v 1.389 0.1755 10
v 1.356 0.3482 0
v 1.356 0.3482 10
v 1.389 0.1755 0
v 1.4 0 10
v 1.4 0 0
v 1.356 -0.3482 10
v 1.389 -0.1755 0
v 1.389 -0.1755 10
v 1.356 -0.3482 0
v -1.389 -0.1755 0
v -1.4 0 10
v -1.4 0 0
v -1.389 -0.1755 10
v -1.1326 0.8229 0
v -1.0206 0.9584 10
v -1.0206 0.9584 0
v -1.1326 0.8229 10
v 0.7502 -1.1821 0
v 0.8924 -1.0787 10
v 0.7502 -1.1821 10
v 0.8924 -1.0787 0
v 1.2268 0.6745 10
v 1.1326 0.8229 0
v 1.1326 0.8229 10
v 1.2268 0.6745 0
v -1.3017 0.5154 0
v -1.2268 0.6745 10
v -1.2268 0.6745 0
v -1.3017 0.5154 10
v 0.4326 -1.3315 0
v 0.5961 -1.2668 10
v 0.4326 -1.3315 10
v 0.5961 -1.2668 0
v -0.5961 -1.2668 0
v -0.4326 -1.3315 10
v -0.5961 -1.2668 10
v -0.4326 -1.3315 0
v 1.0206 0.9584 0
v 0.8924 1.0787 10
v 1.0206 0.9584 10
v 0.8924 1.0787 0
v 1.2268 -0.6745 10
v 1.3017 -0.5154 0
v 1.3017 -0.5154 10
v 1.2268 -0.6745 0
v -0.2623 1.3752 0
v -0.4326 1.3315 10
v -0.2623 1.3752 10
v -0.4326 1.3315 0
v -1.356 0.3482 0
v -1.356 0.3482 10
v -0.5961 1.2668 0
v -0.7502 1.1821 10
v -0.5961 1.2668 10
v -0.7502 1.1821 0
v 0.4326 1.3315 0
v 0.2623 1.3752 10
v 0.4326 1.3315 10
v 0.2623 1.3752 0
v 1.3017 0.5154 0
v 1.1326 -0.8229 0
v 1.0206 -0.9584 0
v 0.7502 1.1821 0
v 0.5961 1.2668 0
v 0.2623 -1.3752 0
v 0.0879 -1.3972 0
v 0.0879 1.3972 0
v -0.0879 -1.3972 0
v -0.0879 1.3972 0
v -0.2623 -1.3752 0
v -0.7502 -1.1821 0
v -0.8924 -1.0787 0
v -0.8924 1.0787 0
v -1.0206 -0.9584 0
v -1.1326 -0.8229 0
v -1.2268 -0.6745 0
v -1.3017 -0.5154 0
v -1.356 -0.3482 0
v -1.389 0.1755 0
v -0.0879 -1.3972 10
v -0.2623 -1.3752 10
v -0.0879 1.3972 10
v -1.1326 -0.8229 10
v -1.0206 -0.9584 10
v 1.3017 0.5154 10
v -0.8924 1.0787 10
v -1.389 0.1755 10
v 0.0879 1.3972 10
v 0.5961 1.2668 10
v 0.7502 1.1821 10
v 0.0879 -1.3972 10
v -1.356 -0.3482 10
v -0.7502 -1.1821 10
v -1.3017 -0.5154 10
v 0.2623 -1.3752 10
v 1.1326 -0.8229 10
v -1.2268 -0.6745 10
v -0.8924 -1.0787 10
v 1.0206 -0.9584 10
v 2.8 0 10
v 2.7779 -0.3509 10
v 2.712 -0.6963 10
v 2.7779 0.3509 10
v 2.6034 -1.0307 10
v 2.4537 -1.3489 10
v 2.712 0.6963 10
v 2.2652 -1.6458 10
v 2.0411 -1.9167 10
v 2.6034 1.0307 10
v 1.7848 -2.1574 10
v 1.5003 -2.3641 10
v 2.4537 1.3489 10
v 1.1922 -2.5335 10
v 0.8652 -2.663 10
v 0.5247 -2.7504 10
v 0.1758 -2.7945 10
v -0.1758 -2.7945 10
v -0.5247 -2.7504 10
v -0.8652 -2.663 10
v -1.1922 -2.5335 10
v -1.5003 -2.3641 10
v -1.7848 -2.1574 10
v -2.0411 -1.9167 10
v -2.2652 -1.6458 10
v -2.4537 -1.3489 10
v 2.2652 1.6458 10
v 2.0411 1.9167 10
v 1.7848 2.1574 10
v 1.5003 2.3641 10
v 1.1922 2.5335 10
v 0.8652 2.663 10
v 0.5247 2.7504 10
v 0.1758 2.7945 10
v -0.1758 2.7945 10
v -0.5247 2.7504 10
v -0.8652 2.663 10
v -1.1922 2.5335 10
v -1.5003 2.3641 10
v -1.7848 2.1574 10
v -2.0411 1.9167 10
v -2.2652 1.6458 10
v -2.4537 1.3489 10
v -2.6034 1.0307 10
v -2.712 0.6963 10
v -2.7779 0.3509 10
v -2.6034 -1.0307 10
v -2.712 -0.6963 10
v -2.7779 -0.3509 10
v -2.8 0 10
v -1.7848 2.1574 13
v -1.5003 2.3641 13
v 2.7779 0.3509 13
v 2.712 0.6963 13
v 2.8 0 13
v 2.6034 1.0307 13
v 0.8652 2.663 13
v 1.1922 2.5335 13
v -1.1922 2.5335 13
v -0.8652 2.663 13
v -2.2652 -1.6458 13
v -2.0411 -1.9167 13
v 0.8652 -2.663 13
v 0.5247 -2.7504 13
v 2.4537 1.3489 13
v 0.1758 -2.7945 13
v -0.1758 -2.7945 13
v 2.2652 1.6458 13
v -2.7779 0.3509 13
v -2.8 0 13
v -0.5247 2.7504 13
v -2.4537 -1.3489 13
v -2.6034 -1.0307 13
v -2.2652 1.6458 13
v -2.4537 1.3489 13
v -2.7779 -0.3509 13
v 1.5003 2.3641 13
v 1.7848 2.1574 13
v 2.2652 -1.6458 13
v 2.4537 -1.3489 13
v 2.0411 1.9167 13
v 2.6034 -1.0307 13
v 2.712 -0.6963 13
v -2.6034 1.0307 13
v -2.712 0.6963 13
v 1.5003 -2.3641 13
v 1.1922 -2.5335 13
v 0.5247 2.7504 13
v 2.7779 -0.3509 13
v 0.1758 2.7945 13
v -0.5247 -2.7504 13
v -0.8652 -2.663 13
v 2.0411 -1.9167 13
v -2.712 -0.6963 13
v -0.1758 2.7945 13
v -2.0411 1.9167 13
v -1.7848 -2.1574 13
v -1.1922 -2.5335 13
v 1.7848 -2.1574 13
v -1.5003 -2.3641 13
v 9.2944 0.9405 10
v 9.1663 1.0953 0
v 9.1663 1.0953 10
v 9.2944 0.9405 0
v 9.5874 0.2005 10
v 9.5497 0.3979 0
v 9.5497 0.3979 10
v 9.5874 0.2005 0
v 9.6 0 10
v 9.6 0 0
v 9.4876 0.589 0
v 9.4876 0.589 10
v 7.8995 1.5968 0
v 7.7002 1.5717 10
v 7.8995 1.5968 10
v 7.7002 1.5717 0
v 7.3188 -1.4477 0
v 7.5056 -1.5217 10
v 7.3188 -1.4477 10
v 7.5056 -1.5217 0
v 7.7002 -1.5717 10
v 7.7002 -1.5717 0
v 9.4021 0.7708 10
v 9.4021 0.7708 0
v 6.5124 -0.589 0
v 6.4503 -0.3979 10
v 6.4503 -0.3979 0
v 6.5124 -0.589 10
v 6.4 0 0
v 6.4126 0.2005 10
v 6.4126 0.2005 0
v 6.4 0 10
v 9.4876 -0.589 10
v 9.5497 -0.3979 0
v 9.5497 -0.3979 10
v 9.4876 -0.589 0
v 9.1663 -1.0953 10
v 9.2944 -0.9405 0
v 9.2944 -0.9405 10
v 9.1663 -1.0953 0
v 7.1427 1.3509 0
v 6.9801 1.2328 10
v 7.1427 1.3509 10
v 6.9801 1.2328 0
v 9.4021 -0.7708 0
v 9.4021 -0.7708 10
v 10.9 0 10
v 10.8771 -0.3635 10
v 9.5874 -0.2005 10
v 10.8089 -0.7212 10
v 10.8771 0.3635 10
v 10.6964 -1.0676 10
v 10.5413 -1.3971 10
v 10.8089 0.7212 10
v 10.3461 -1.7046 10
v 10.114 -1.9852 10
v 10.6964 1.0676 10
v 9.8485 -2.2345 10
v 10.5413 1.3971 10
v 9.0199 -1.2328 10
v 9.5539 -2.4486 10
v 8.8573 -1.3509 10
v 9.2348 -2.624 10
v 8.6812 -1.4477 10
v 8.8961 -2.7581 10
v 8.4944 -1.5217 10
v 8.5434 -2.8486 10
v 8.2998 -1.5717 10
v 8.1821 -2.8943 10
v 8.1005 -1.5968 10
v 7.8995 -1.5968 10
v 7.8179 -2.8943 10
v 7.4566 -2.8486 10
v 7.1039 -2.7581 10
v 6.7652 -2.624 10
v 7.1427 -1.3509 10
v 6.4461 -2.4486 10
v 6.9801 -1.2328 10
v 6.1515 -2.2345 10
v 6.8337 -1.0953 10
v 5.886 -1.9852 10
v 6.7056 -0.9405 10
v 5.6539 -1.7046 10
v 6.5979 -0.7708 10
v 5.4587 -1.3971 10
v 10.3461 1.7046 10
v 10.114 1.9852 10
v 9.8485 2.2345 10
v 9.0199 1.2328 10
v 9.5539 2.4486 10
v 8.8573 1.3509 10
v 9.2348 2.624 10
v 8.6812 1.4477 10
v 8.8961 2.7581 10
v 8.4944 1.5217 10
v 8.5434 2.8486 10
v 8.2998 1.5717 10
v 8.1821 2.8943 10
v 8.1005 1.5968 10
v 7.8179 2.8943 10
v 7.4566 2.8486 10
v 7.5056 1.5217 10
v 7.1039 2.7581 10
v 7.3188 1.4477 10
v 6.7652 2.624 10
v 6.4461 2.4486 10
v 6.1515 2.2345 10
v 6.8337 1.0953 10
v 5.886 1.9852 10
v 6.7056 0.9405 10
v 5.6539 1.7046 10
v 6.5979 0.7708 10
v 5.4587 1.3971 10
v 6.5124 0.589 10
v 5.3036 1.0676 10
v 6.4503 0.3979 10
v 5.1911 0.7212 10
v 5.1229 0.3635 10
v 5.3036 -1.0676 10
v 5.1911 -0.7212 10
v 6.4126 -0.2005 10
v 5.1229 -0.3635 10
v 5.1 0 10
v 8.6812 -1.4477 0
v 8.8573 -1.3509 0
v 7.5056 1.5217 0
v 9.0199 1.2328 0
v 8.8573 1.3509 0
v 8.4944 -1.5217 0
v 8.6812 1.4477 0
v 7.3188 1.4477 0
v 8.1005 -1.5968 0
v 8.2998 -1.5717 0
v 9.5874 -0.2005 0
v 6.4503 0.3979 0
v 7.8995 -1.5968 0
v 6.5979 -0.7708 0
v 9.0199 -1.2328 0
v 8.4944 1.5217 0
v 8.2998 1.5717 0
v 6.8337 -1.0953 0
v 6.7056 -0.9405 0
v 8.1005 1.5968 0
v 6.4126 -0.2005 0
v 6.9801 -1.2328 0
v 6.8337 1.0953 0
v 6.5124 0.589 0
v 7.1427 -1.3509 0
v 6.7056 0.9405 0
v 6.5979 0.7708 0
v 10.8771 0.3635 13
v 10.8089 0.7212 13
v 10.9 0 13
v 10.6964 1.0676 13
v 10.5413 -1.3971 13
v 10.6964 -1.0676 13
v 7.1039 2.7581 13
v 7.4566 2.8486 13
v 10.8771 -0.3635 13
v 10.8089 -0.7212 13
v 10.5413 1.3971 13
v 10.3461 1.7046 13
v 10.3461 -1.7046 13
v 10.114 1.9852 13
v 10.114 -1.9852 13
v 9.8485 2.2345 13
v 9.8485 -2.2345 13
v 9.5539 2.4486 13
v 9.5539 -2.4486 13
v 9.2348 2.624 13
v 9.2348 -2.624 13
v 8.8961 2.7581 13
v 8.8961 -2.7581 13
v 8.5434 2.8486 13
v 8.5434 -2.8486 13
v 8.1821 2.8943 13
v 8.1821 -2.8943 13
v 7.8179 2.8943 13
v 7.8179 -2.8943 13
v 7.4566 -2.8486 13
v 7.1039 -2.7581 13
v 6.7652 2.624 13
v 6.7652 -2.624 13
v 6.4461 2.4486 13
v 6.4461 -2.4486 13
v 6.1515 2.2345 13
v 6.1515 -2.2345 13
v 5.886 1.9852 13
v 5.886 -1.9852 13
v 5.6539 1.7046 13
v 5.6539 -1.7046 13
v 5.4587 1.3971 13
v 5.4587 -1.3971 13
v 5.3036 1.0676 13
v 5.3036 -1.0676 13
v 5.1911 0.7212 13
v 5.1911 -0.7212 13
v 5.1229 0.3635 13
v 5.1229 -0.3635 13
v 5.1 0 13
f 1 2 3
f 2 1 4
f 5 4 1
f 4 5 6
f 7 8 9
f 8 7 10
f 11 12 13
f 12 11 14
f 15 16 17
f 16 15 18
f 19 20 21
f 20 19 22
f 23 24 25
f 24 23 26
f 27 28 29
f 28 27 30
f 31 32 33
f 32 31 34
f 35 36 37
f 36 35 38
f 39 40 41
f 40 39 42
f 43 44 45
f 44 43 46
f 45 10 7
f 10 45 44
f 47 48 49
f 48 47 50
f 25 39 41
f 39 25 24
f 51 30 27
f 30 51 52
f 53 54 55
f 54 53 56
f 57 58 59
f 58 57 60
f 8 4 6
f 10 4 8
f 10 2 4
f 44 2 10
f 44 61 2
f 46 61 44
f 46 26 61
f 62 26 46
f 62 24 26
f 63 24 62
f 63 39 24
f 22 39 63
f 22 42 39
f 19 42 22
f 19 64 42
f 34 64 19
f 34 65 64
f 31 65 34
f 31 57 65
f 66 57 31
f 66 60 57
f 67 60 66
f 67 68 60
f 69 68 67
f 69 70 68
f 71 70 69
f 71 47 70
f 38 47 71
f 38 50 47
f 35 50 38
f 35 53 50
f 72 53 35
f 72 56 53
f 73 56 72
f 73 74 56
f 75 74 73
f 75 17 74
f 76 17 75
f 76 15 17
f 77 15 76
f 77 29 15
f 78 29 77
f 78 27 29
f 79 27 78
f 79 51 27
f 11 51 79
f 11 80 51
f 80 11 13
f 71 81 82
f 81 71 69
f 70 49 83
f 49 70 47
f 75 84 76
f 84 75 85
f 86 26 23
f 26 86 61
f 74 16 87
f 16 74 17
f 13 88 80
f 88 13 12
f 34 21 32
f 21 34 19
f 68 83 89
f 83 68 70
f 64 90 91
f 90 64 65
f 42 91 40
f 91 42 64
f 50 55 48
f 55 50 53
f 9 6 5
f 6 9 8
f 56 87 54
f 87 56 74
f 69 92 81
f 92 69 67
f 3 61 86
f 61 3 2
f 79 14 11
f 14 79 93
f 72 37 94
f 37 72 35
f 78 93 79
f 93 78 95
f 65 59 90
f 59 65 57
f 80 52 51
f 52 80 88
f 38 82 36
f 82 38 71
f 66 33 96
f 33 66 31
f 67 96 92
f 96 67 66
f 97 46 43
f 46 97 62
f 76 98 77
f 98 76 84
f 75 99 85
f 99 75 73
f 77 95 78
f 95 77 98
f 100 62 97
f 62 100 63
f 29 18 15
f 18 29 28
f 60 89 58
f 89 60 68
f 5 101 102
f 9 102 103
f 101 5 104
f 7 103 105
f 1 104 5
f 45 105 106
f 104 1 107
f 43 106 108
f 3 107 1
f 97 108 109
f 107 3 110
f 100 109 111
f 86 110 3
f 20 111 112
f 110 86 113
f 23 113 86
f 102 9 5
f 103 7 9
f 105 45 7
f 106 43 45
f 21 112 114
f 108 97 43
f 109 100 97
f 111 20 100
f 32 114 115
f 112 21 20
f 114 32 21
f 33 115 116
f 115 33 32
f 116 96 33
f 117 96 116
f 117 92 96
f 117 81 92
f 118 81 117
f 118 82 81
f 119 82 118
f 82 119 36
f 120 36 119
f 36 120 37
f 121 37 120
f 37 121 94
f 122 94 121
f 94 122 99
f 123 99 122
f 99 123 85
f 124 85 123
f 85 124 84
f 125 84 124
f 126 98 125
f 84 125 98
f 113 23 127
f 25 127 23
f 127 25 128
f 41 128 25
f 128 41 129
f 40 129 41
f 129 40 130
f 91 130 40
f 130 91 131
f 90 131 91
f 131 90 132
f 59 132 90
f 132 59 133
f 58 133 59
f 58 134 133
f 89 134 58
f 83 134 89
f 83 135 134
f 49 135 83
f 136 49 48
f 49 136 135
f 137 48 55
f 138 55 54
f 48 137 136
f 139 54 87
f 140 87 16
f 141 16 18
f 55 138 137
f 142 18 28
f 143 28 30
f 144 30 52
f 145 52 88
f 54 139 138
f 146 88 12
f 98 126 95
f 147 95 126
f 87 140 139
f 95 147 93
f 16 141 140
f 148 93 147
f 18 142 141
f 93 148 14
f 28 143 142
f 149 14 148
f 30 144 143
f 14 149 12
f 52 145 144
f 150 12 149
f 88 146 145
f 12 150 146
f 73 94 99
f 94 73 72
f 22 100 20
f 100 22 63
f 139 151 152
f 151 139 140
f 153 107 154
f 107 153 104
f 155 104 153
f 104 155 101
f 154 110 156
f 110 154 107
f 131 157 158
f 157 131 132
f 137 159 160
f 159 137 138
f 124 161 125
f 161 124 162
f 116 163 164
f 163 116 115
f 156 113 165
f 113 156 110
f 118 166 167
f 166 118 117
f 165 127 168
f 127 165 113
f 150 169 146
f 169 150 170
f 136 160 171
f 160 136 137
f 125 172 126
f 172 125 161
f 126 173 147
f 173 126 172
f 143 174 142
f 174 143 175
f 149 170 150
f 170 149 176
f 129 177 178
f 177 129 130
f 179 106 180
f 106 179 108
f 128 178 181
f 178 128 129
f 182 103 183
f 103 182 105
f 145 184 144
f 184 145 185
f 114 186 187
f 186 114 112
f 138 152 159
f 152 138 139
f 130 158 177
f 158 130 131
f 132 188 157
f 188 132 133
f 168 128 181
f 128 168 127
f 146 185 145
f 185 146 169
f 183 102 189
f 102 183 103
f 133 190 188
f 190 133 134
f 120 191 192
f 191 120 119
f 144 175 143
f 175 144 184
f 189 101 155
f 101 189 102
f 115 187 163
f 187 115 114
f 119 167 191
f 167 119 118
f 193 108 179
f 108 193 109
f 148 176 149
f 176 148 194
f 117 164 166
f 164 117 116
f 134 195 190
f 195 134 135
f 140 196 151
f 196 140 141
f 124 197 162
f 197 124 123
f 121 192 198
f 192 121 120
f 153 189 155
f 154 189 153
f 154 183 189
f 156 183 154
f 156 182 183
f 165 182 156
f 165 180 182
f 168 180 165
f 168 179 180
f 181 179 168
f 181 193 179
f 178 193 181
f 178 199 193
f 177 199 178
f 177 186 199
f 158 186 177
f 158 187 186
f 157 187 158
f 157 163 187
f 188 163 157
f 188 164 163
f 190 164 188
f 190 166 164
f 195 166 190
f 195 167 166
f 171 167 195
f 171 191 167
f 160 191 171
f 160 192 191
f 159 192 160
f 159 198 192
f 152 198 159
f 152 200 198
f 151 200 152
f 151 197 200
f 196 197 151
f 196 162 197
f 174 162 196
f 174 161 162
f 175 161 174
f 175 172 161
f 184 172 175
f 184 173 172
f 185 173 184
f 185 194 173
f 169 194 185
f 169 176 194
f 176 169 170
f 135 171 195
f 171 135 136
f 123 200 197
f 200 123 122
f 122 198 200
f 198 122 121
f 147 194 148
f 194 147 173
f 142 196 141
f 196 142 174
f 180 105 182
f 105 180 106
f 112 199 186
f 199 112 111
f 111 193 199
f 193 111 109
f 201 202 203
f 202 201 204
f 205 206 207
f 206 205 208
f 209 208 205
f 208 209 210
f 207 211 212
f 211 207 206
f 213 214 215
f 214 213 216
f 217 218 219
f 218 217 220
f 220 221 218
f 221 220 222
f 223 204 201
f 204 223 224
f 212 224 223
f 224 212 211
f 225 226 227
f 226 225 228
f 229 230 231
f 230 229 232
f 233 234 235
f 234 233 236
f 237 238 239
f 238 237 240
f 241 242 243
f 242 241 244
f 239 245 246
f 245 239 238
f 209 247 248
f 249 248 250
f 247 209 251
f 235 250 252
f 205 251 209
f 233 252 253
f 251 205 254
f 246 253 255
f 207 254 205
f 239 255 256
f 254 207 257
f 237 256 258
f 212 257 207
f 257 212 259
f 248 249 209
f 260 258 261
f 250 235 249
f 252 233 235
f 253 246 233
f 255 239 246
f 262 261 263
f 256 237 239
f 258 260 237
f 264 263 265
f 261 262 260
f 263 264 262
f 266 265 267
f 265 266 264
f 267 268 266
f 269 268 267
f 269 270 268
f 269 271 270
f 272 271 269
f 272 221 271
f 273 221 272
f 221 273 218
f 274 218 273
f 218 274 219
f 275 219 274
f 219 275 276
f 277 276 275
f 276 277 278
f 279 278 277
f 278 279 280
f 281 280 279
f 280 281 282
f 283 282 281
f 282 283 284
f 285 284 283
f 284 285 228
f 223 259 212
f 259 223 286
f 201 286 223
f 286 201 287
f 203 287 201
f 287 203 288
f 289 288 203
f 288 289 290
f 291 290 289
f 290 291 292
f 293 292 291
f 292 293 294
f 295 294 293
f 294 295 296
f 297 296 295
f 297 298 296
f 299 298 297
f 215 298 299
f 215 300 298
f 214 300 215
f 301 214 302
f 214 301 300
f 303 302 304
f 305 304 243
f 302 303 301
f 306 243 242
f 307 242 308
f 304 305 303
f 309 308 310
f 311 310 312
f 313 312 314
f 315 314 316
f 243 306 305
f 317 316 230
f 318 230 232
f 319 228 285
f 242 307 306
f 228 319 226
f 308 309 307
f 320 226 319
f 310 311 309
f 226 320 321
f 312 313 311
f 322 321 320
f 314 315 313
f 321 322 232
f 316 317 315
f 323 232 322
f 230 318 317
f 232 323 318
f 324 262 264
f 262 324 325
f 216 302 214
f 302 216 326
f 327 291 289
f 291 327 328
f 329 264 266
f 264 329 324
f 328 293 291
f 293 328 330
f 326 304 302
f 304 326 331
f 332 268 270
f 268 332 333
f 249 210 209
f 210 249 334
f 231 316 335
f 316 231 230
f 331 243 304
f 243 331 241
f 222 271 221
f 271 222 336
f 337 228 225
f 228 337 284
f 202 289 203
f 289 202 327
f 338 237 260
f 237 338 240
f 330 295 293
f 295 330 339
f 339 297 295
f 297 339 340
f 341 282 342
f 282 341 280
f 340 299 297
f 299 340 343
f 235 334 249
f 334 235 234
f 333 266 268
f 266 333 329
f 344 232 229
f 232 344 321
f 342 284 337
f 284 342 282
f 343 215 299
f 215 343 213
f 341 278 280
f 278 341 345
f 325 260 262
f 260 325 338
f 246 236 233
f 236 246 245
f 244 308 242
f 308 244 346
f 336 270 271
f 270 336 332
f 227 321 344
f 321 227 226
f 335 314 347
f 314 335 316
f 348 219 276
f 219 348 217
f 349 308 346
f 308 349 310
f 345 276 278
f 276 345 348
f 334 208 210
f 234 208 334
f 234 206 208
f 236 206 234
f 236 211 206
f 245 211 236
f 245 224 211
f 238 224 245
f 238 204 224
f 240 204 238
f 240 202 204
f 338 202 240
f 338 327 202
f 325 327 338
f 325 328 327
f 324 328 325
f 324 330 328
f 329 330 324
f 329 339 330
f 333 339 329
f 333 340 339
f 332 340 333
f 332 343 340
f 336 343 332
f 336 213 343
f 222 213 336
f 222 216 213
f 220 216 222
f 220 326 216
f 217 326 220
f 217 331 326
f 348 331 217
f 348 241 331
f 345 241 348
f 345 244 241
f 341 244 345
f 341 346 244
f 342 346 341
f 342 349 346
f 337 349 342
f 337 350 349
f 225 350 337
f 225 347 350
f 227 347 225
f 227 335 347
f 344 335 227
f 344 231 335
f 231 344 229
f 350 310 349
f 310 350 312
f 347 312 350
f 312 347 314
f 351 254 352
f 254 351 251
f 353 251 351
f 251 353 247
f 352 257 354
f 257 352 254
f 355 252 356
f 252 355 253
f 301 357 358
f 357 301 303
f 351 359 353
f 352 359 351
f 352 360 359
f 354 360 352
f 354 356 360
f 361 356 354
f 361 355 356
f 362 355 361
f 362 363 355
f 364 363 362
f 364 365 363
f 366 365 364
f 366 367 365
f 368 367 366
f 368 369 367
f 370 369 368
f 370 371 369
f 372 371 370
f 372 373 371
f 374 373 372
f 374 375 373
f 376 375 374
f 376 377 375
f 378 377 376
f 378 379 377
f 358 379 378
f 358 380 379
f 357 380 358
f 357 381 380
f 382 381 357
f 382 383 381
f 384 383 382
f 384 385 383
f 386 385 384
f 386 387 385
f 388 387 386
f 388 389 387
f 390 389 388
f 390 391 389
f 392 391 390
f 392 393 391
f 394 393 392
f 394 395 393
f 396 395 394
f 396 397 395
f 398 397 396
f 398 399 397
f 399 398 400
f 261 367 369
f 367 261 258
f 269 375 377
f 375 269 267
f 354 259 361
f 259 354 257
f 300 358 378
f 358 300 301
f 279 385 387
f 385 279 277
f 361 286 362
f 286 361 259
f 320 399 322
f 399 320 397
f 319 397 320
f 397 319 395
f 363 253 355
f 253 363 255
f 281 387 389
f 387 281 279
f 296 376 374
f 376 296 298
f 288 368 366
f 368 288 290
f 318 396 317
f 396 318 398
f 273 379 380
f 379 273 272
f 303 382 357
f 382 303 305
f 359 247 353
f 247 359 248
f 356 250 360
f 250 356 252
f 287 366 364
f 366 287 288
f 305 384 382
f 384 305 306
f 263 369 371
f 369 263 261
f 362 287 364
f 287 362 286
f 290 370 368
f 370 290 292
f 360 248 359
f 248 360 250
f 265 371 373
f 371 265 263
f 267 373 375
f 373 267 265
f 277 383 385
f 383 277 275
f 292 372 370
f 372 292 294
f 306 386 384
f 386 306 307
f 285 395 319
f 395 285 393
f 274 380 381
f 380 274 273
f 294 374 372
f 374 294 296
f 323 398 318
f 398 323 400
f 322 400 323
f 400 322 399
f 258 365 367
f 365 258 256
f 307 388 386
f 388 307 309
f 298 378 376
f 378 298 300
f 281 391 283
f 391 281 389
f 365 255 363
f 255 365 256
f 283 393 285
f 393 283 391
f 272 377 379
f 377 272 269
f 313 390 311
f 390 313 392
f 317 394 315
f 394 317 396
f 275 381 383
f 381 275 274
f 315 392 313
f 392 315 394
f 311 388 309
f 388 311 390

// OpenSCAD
headRadius = 5.6 / 2;
screewRadius = 3 / 2;
faces = 50;



module m3Tight (height = 10, headHeight = 3) {
    color("#5f7f5f") {
        cylinder(h = height, r = screewRadius - 0.1, $fn=faces);
        
        translate(v = [0,0,height]) 
        cylinder(h = headHeight, r = headRadius, $fn=faces);
    }
}


module m3Loose (height = 10, headHeight = 3) {
    color("#8c5353") {
        cylinder(h = height, r = screewRadius + 0.1, $fn=faces);
        
        translate(v = [0,0,height]) 
        cylinder(h = headHeight, r = headRadius + 0.1, $fn=faces);
    }
}

m3Tight();

translate(v = [8,0,0]) 
m3Loose();
